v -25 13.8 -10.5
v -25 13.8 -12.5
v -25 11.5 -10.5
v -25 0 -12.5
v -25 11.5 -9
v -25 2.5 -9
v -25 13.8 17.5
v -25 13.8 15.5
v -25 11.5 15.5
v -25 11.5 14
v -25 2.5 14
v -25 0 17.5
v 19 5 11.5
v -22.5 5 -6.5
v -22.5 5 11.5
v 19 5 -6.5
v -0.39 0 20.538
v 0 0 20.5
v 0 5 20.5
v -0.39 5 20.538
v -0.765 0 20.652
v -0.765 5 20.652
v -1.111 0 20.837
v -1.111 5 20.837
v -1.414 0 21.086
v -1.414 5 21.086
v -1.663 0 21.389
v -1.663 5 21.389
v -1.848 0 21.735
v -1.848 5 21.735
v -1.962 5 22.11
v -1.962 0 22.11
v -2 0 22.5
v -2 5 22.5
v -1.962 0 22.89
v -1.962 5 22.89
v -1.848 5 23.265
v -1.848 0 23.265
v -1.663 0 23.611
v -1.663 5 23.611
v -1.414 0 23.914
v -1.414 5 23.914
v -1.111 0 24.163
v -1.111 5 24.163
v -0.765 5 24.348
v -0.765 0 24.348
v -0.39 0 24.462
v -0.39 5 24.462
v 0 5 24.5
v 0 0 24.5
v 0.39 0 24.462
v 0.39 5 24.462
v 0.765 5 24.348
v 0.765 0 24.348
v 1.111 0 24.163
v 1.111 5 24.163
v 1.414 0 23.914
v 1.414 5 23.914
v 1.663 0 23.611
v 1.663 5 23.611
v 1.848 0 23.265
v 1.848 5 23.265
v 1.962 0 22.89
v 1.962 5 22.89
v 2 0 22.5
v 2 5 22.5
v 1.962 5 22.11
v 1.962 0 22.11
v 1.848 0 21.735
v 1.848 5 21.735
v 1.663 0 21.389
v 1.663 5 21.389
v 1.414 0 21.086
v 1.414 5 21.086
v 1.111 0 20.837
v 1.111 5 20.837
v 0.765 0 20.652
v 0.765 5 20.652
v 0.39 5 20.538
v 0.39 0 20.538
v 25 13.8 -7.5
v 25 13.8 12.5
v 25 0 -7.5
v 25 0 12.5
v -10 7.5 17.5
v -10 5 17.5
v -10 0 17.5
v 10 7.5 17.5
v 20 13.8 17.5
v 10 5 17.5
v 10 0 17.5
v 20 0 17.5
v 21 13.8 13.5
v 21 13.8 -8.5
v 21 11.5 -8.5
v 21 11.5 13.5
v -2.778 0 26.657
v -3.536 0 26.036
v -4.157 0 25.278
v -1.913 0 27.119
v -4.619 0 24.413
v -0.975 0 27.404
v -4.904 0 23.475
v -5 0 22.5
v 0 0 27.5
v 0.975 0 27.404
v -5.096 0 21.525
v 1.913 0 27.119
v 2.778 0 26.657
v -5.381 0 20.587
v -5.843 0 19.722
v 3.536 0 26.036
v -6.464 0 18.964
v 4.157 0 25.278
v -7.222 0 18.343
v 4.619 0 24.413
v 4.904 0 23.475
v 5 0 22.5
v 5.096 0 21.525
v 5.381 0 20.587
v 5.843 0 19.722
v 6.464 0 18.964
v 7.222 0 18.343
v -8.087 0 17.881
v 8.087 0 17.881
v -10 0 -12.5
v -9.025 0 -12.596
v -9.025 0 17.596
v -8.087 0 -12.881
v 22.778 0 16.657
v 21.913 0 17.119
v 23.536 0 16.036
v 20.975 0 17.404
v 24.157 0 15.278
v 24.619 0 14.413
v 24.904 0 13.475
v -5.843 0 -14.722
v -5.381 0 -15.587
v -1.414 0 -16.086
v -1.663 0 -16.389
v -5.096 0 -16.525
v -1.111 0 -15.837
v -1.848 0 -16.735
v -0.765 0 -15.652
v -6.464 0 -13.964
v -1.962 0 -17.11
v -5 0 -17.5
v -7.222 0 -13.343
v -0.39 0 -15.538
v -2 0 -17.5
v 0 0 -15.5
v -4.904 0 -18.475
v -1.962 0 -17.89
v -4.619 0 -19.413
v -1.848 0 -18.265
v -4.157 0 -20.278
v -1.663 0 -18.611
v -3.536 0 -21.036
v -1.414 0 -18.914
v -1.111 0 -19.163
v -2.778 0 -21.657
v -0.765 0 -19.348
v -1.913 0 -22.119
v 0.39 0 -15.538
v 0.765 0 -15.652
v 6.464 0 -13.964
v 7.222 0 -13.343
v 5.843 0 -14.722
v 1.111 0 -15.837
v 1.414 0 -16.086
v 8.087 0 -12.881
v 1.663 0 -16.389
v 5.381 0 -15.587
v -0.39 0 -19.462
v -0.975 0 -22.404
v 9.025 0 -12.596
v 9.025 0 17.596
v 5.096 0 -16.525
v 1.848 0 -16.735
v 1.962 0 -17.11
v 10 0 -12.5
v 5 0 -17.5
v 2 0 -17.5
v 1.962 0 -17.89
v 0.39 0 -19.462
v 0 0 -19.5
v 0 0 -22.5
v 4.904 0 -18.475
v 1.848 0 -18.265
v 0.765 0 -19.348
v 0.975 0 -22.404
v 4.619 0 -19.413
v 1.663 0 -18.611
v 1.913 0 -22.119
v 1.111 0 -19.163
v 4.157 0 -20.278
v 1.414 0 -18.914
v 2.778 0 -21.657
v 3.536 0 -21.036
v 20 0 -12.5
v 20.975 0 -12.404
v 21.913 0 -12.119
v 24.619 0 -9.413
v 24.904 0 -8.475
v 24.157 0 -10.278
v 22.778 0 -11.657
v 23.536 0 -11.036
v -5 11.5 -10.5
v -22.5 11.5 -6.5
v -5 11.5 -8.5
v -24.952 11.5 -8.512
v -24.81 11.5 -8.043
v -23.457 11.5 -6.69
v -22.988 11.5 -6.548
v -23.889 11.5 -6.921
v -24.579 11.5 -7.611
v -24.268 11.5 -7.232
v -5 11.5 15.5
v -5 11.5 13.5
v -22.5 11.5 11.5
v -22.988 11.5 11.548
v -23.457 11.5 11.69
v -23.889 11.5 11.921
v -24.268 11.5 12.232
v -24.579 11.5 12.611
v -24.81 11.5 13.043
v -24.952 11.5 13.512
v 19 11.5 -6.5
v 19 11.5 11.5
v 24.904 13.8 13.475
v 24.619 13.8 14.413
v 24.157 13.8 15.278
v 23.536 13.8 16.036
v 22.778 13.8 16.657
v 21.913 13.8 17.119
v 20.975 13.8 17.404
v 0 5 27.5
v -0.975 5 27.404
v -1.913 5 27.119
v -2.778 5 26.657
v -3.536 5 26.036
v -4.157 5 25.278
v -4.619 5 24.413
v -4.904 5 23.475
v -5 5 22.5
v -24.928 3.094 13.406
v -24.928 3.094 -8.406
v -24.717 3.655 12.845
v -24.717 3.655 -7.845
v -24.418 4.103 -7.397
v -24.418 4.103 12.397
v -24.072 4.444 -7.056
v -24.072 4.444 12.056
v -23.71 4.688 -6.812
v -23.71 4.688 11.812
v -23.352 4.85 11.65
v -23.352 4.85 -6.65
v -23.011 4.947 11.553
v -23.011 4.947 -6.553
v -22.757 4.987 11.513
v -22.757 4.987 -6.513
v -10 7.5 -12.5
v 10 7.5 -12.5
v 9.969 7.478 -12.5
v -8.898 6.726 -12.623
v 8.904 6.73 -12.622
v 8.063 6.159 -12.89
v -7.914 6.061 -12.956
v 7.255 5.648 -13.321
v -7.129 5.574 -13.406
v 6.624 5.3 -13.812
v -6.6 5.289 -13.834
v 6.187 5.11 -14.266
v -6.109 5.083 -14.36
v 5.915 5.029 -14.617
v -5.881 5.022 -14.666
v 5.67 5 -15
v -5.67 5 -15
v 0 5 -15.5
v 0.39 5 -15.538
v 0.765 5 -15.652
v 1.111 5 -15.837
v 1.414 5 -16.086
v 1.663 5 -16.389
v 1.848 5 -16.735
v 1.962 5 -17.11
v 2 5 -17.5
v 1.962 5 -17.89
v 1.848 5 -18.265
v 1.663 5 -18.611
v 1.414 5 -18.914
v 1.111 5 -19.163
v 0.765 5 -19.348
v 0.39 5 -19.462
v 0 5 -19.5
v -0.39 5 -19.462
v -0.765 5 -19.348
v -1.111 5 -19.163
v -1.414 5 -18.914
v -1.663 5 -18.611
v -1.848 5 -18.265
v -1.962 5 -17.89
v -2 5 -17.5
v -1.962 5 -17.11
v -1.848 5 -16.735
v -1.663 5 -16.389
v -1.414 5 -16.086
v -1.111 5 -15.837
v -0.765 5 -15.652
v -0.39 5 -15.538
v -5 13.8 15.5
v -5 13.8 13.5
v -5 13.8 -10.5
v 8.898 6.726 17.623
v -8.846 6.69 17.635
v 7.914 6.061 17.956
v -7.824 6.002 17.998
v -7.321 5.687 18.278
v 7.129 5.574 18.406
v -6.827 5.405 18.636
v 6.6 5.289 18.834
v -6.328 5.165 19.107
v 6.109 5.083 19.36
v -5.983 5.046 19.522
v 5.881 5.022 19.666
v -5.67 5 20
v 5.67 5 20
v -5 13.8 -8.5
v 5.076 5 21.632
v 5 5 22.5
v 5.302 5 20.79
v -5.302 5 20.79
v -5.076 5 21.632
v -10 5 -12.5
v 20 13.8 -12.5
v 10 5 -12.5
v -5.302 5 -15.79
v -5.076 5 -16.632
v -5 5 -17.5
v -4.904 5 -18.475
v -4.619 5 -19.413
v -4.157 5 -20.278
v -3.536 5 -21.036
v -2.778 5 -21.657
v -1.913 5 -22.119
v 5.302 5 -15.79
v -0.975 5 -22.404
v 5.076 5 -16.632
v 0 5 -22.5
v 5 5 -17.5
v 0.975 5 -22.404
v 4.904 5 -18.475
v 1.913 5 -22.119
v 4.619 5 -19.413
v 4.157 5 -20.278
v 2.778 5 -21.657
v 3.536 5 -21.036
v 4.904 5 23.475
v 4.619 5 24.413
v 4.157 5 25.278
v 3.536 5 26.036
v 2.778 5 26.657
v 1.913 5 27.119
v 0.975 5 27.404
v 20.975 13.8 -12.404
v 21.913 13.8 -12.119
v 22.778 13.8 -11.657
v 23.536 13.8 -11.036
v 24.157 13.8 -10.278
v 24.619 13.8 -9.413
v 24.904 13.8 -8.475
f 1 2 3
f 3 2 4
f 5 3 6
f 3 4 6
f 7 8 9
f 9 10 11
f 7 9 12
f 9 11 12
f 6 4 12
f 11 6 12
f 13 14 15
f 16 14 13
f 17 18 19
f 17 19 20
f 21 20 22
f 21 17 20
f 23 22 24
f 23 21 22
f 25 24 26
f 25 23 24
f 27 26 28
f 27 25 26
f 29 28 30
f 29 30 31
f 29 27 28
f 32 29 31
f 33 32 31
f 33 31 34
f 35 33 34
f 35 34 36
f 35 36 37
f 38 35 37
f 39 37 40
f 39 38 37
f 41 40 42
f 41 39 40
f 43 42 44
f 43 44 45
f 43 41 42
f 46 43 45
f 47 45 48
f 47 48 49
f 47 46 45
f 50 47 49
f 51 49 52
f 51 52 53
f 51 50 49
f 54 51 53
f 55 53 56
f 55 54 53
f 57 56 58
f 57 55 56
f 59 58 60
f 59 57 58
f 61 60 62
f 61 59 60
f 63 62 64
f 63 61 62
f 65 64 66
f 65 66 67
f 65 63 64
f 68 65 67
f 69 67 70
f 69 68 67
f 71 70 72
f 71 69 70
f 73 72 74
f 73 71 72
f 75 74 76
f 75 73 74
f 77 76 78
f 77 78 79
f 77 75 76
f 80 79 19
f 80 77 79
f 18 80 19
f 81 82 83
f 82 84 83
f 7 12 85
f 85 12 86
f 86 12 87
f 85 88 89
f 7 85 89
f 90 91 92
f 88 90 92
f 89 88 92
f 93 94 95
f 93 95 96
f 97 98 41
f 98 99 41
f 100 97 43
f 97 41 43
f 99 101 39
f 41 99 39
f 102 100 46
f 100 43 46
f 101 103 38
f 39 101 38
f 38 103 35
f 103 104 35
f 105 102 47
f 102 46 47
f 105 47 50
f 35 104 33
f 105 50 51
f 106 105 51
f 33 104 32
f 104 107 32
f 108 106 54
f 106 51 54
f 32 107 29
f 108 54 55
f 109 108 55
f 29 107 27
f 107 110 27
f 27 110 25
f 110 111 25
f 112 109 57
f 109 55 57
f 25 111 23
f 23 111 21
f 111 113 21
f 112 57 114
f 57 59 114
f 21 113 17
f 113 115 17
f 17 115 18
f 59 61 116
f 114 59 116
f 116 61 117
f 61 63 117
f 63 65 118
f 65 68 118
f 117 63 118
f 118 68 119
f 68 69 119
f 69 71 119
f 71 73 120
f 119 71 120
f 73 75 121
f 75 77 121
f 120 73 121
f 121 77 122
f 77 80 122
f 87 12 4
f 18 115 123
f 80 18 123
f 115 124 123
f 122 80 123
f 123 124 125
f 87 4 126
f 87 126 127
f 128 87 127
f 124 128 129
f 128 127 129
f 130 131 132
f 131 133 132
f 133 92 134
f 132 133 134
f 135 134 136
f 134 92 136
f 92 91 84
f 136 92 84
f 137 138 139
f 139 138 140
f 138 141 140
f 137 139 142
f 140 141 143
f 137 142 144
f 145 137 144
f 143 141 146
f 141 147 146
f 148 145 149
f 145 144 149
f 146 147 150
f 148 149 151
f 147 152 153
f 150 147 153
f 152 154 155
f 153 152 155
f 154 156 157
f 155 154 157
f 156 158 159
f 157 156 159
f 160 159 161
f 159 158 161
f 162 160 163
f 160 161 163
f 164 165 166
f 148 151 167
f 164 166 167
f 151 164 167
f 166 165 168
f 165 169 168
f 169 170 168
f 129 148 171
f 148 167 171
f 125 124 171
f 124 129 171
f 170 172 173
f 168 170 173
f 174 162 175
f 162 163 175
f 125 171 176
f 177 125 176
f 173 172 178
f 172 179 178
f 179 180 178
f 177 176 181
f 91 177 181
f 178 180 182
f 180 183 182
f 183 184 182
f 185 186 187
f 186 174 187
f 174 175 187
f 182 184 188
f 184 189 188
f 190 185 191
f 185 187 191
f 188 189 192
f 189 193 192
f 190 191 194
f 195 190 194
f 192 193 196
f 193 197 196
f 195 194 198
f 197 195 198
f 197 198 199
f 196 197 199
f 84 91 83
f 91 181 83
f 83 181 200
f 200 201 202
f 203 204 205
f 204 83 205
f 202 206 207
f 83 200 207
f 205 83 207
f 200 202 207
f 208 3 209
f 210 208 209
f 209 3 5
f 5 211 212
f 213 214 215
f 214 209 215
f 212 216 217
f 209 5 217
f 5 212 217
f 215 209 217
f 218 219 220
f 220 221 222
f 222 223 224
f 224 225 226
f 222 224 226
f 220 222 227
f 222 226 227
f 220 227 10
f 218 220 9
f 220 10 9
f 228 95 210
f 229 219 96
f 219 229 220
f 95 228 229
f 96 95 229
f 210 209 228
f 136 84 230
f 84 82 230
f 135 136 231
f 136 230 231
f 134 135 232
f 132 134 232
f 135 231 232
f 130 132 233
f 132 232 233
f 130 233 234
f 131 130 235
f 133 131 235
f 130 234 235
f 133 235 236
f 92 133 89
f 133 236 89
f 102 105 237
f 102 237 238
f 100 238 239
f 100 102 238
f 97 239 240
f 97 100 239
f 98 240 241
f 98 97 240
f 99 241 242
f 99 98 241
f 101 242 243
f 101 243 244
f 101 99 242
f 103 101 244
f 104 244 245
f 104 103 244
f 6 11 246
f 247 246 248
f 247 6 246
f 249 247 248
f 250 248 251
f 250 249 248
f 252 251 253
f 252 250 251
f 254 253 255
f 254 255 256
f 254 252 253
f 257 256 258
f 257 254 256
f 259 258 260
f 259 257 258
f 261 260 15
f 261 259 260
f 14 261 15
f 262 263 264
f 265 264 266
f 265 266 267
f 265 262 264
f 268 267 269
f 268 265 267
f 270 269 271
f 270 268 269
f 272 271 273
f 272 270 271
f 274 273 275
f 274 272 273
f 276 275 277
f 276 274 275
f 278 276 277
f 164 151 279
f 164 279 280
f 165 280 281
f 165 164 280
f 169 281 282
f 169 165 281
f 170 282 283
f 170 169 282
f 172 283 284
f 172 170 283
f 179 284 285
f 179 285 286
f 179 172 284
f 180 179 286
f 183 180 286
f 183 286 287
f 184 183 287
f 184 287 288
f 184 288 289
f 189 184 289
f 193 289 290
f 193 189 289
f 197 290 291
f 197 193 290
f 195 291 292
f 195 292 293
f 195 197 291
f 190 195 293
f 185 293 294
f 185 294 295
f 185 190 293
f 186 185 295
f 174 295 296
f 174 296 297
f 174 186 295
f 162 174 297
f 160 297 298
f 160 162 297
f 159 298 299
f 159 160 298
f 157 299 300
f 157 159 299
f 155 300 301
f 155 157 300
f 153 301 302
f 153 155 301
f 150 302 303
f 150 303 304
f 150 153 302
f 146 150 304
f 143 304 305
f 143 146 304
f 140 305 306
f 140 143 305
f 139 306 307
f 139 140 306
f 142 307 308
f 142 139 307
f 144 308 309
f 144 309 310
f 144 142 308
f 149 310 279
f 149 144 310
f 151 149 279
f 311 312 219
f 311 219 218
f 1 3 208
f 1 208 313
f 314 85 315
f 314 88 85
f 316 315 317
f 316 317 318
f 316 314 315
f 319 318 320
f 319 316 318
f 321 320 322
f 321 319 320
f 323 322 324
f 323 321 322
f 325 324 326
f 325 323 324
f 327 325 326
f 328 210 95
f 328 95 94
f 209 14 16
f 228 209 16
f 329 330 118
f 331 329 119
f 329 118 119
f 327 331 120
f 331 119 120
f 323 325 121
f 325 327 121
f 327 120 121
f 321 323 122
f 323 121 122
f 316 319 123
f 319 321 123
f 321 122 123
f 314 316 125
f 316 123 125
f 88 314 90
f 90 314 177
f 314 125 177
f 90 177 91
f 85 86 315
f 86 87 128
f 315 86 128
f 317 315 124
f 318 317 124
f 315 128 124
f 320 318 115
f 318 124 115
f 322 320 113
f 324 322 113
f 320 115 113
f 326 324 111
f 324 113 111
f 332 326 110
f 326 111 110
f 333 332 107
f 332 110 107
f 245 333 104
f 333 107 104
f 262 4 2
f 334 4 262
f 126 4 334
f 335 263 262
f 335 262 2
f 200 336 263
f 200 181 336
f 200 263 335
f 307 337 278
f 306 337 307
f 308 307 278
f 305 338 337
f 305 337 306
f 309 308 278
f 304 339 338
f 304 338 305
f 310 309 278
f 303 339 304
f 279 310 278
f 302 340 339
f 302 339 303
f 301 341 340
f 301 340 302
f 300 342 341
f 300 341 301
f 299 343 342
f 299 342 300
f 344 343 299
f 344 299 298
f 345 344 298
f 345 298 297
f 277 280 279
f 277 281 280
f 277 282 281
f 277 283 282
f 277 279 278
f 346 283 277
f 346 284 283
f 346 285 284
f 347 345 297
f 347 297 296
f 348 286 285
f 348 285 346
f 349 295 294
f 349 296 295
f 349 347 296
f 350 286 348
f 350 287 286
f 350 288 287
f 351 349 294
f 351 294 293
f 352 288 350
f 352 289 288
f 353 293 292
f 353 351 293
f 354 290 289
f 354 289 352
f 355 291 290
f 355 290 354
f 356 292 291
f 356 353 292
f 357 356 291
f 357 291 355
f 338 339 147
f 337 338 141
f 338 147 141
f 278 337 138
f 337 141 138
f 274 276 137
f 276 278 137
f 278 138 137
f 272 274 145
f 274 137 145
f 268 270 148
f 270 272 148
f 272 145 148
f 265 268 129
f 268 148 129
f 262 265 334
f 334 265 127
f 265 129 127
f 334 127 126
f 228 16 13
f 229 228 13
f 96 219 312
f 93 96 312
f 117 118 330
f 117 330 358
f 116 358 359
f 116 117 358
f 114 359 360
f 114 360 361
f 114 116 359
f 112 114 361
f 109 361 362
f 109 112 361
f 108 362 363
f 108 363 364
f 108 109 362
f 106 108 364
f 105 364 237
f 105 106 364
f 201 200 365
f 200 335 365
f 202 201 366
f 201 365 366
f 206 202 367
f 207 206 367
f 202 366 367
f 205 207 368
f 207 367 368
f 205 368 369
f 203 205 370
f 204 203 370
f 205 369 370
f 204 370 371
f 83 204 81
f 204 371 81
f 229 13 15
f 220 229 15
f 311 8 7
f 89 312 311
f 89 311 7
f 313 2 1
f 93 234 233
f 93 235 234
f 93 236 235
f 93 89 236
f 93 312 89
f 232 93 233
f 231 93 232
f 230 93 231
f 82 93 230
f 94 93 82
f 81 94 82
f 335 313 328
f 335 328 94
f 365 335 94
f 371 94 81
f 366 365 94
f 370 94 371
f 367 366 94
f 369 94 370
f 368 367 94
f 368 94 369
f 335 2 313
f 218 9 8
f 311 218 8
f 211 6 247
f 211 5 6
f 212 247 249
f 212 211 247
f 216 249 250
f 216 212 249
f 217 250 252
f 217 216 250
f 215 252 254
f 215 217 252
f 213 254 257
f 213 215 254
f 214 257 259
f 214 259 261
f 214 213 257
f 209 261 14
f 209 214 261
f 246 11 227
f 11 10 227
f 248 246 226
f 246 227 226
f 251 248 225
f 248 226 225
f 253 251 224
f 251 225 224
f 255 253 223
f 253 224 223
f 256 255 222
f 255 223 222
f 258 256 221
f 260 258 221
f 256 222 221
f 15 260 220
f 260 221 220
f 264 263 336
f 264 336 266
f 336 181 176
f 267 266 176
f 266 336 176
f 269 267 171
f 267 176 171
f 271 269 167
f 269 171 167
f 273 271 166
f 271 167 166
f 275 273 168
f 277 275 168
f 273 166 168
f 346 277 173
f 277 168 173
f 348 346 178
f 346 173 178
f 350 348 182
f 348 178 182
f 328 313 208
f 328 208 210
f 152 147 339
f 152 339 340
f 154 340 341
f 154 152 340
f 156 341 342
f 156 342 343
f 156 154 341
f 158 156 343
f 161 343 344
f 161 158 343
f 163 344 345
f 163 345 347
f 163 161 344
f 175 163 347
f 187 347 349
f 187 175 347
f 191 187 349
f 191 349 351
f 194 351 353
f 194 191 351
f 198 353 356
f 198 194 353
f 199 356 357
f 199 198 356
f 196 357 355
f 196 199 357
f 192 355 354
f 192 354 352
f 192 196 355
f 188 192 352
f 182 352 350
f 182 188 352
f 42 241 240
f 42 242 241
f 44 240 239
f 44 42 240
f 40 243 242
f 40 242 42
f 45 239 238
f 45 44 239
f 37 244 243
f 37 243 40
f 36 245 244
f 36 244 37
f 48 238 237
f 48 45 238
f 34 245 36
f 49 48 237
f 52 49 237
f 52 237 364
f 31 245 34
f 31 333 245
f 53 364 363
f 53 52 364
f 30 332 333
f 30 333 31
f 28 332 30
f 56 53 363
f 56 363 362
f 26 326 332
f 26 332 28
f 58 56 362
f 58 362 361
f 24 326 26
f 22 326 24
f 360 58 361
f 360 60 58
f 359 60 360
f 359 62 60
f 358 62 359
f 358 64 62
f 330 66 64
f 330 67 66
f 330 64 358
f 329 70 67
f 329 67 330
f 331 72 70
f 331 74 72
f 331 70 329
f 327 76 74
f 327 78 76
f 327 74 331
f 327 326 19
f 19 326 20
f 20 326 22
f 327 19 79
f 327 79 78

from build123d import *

# Parameters (mm, degrees)
SKETCH2_R           = 2
BOSS_EXTRUDE1_DEPTH = 5
FILLET1_START       = -1
FILLET1_DEPTH       = 7
FILLET1_2_DEPTH     = 5
BOSS_EXTRUDE2_DEPTH = 8.8
SKETCH4_W           = 22
SKETCH4_H           = 2.3
CUT_EXTRUDE1_DEPTH  = 46
SKETCH5_W           = 2
SKETCH5_H           = 2.3
CUT_EXTRUDE2_DEPTH  = 20
FILLET2_R           = 5
FILLET3_R           = 2.5


with BuildPart() as part:
    # Sketch2 → Boss-Extrude1 (new body)
    with BuildSketch(Plane(origin=(0, 0, 0), x_dir=(1, 0, 0), z_dir=(0, 1, 0))):
        Polygon((5, 12.5), (25, 12.5), (25, -17.5), (5, -17.5), (5, -27.5), (-5, -27.5), (-5, -17.5), (-25, -17.5), (-25, 12.5), (-5, 12.5), (-5, 22.5), (5, 22.5), align=None)
        with Locations(Location((0, 17.5, 0), (0, 0, 270))):
            Circle(SKETCH2_R, mode=Mode.SUBTRACT)
        with Locations(Location((0, -22.5, 0), (0, 0, 90))):
            Circle(SKETCH2_R, mode=Mode.SUBTRACT)
    extrude(amount=BOSS_EXTRUDE1_DEPTH)

    # Fillet1: read off the stored shape, not the designer's step
    # Fillet1 outline → Fillet1 (cut)
    with BuildSketch(Plane(origin=(0, 0, 0), x_dir=(1, 0, 0), z_dir=(0, 1, 0)).offset(FILLET1_START)):
        with BuildLine():
            ThreePointArc((5, -22.5), (3.535533906, -26.035533906), (0, -27.5))
            Line((0, -27.5), (5, -27.5))
            Line((5, -27.5), (5, -22.5))
        make_face()
        with BuildLine():
            ThreePointArc((0, -27.5), (-3.535533906, -26.035533906), (-5, -22.5))
            Line((-5, -22.5), (-5, -27.5))
            Line((-5, -27.5), (0, -27.5))
        make_face()
        with BuildLine():
            ThreePointArc((-5, 17.5), (-3.535533906, 21.035533906), (0, 22.5))
            Line((0, 22.5), (-5, 22.5))
            Line((-5, 22.5), (-5, 17.5))
        make_face()
        with BuildLine():
            ThreePointArc((0, 22.5), (3.535533906, 21.035533906), (5, 17.5))
            Line((5, 17.5), (5, 22.5))
            Line((5, 22.5), (0, 22.5))
        make_face()
    extrude(amount=FILLET1_DEPTH, mode=Mode.SUBTRACT)

    # Fillet1 2 outline → Fillet1 2 (add)
    with BuildSketch(Plane(origin=(0, 0, 0), x_dir=(1, 0, 0), z_dir=(0, 1, 0))):
        with BuildLine():
            Line((5, -17.5), (5, -22.5))
            ThreePointArc((5, -22.5), (6.464466094, -18.964466094), (10, -17.5))
            Line((10, -17.5), (5, -17.5))
        make_face()
        with BuildLine():
            ThreePointArc((-10, -17.5), (-6.464466094, -18.964466094), (-5, -22.5))
            Line((-5, -22.5), (-5, -17.5))
            Line((-5, -17.5), (-10, -17.5))
        make_face()
        with BuildLine():
            Line((-5, 12.5), (-5, 17.5))
            ThreePointArc((-5, 17.5), (-6.464466094, 13.964466094), (-10, 12.5))
            Line((-10, 12.5), (-5, 12.5))
        make_face()
        with BuildLine():
            ThreePointArc((10, 12.5), (6.464466094, 13.964466094), (5, 17.5))
            Line((5, 17.5), (5, 12.5))
            Line((5, 12.5), (10, 12.5))
        make_face()
    extrude(amount=FILLET1_2_DEPTH)

    # Sketch3 → Boss-Extrude2 (add)
    with BuildSketch(Plane(origin=(0, 5, 0), x_dir=(1, 0, 0), z_dir=(0, 1, 0))):
        Polygon((-25, -11.5), (-25, -17.5), (25, -17.5), (25, 12.5), (-25, 12.5), (-25, 6.5), (19, 6.5), (19, -11.5), align=None)
    extrude(amount=BOSS_EXTRUDE2_DEPTH)

    # Sketch4 → Cut-Extrude1 (cut)
    with BuildSketch(Plane.ZY.offset(25)):
        with Locations((2.5, 12.65)):
            Rectangle(SKETCH4_W, SKETCH4_H)
    extrude(amount=-CUT_EXTRUDE1_DEPTH, mode=Mode.SUBTRACT)

    # Sketch5 → Cut-Extrude2 (cut)
    with BuildSketch(Plane.ZY.offset(25)):
        with Locations((-9.5, 12.65)):
            Rectangle(SKETCH5_W, SKETCH5_H)
        with Locations((14.5, 12.65)):
            Rectangle(SKETCH5_W, SKETCH5_H)
    extrude(amount=-CUT_EXTRUDE2_DEPTH, mode=Mode.SUBTRACT)

    # Fillet2
    fillet2_edges = [part.edges().sort_by_distance(p)[0] for p in [
        (25, 6.9, 17.5),
        (25, 6.9, -12.5),
    ]]
    fillet(fillet2_edges, radius=FILLET2_R)

    # Fillet3
    fillet3_edges = [part.edges().sort_by_distance(p)[0] for p in [
        (-25, 8.25, 11.5),
        (-25, 8.25, -6.5),
        (-25, 5, 2.5),
        (0, 5, 17.5),
        (0, 5, -12.5),
    ]]
    fillet(fillet3_edges, radius=FILLET3_R)


solid = part.part
